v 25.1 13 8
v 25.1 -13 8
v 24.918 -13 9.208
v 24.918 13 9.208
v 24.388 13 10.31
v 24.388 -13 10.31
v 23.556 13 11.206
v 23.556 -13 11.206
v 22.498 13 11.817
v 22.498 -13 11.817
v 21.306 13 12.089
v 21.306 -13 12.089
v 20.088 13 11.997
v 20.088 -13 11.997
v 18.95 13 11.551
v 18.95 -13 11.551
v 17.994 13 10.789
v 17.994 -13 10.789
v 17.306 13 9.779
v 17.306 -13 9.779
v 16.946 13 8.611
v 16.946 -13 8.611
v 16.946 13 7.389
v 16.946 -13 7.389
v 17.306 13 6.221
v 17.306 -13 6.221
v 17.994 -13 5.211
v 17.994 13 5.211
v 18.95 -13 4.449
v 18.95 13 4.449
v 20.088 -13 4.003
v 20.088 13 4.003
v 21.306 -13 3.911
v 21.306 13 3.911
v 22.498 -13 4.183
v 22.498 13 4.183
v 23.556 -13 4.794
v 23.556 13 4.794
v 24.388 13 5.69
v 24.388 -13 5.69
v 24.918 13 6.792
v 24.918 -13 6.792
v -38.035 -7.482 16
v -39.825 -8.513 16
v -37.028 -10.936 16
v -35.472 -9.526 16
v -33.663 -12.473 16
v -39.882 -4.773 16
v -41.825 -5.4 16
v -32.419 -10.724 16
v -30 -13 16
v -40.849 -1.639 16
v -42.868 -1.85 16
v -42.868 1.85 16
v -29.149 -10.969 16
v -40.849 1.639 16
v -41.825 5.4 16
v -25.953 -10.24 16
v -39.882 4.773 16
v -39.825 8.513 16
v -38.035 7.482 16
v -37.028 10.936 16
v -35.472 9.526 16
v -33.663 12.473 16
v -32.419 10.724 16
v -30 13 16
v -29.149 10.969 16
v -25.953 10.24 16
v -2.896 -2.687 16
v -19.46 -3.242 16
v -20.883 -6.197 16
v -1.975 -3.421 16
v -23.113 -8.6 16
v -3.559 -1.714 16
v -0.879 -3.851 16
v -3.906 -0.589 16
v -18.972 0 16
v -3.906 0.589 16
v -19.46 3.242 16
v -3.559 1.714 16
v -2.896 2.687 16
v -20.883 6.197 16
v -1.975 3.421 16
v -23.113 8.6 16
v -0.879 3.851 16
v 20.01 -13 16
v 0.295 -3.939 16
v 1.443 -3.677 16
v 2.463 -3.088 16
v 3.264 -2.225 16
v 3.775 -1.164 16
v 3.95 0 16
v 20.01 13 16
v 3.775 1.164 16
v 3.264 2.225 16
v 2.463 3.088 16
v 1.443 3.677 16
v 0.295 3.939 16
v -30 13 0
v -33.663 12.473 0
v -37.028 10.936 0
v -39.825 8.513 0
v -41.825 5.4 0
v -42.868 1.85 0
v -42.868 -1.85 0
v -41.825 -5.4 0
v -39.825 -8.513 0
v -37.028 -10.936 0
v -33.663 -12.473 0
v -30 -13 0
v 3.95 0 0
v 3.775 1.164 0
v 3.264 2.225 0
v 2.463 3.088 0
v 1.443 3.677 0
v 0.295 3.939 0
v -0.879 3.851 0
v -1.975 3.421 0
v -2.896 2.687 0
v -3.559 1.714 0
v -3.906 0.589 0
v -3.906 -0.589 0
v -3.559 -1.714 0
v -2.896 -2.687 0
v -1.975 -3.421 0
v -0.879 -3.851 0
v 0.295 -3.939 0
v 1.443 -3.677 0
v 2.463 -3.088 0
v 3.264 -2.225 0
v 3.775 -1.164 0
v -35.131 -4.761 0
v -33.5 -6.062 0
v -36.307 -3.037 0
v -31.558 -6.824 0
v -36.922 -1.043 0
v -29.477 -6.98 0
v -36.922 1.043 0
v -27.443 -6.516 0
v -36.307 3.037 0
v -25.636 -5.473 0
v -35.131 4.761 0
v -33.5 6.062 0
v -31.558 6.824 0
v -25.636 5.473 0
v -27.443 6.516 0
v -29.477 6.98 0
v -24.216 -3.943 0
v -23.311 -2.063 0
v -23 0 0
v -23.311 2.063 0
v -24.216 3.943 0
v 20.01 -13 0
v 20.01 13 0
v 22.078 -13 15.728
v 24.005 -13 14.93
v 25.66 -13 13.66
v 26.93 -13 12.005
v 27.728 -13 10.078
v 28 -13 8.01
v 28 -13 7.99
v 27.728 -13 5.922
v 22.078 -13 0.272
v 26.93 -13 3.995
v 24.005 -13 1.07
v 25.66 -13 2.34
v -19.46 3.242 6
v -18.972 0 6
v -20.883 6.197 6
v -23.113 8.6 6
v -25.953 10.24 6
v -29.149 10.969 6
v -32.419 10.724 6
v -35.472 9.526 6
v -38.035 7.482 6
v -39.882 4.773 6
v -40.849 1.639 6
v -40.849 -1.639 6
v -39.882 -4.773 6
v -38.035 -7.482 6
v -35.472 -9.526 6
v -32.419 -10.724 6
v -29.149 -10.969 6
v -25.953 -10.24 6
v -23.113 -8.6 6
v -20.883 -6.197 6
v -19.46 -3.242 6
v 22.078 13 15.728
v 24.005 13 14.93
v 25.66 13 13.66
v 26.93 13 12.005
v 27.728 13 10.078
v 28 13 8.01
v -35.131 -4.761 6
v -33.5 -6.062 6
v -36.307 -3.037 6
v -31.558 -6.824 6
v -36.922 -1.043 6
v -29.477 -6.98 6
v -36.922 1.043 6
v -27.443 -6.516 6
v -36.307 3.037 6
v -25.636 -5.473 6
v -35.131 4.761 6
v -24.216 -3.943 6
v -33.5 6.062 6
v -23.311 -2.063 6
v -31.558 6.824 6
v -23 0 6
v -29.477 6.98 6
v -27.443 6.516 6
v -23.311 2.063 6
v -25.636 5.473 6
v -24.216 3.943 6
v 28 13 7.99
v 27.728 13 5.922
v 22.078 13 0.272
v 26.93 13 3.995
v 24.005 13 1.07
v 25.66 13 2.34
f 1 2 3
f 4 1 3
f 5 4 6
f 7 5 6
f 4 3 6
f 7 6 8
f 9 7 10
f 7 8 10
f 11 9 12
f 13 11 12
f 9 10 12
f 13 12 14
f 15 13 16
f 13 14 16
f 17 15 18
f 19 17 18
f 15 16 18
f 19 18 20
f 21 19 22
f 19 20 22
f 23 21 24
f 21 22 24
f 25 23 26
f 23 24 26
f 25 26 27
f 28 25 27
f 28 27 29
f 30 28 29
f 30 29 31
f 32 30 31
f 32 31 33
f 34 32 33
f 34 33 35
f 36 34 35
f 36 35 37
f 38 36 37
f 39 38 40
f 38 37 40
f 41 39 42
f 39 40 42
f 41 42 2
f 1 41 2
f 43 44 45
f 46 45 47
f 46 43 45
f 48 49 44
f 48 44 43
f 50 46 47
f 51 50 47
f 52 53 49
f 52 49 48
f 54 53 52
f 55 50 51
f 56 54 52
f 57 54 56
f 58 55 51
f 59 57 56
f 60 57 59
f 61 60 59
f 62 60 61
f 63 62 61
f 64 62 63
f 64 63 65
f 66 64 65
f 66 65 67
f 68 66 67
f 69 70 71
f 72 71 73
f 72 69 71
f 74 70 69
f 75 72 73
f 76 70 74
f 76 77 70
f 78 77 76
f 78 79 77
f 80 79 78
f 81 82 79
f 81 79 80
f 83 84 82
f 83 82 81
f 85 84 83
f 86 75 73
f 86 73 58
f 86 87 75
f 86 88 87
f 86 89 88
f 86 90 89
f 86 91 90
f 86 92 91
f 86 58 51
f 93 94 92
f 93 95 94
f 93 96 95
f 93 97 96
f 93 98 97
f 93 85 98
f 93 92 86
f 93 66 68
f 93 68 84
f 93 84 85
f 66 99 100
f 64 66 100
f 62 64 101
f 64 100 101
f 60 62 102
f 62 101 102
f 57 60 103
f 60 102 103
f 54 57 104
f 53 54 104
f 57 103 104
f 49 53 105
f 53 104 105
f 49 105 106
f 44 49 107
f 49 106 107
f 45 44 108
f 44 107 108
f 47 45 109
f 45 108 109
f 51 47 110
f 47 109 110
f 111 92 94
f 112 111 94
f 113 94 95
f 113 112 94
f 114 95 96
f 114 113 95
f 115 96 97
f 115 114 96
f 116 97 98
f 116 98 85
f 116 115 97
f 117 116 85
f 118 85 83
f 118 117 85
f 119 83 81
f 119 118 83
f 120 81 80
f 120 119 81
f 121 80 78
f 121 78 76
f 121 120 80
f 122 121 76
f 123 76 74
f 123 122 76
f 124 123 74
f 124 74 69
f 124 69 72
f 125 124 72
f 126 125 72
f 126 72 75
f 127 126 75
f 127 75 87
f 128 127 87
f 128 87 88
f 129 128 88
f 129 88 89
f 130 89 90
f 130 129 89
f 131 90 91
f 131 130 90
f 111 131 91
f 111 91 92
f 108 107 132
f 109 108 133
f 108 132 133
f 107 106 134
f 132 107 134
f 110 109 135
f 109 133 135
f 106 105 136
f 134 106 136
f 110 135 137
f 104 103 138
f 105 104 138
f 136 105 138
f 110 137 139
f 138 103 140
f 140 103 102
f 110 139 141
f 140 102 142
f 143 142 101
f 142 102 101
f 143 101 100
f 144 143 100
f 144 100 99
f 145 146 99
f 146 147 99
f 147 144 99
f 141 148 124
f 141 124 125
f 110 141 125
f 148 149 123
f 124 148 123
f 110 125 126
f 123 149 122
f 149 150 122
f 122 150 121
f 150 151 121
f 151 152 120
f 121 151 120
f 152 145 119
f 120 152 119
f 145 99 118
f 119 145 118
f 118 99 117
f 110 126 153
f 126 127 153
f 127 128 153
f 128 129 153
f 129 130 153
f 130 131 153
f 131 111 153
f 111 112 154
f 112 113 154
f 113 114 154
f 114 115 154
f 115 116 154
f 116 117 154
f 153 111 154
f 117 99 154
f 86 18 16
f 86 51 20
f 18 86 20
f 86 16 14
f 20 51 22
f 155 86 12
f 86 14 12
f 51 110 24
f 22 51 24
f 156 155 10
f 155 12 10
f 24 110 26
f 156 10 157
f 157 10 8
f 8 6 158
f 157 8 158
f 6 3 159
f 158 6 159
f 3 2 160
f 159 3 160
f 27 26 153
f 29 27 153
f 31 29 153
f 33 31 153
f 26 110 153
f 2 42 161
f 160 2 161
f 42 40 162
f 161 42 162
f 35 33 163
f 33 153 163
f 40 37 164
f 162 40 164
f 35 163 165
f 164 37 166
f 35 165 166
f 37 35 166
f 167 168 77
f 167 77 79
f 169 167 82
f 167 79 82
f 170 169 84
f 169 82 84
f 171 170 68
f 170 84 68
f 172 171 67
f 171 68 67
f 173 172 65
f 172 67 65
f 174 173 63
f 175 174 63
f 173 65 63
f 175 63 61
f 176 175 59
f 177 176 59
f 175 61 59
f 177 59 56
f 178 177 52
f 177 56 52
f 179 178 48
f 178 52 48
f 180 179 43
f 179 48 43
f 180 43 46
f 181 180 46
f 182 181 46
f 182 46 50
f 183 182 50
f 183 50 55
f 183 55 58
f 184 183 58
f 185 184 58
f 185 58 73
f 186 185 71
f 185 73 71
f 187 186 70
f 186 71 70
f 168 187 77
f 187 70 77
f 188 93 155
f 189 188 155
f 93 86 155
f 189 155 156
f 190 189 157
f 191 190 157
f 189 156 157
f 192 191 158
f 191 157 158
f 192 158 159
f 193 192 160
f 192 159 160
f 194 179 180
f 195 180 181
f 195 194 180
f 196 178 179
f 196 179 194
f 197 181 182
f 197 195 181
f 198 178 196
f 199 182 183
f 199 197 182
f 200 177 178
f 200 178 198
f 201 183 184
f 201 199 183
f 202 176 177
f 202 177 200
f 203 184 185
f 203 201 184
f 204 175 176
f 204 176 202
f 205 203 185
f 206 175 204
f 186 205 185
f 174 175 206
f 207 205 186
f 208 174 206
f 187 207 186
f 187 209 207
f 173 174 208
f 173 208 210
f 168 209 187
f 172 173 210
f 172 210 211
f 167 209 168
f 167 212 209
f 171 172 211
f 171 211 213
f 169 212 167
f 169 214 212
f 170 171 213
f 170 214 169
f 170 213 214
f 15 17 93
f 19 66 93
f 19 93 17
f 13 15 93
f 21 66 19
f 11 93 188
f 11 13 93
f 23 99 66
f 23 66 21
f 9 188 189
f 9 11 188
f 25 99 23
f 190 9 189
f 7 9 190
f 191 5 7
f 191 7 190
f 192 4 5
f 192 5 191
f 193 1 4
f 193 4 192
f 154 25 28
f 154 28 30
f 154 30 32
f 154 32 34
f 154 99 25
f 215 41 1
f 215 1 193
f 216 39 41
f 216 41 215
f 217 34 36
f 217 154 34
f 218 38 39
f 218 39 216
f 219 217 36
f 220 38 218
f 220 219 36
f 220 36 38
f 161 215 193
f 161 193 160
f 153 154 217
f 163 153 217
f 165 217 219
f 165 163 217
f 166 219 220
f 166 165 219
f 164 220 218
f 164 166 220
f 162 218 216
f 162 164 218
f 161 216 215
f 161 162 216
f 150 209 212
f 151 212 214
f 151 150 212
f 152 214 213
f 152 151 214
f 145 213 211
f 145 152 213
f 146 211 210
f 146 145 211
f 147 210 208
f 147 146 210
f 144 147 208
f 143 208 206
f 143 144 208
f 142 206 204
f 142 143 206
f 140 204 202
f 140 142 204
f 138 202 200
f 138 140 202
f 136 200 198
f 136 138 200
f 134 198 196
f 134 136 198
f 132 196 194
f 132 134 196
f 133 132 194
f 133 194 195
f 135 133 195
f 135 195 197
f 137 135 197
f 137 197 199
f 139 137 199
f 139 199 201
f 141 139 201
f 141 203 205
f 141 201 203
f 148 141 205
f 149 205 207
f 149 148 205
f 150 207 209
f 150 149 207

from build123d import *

# Parameters (mm, degrees)
SKETCH002_R  = 11
PAD002_DEPTH = 10
SKETCH001_R  = 4.1
PAD001_DEPTH = 26
SKETCH_R     = 7
SKETCH_R_2   = 3.95
PAD_DEPTH    = 16
FILLET_R     = 7.99


with BuildPart() as pad002:
    # Sketch002 → Pad002 (new body)
    with BuildSketch(Plane.XY.offset(16)):
        with Locations((-29.971518, 0)):
            Circle(SKETCH002_R)
    extrude(amount=-PAD002_DEPTH)


with BuildPart() as cutblock:
    # Sketch001 → Pad001 (new body)
    with BuildSketch(Plane.XZ.offset(13)):
        with Locations((21, 8)):
            Circle(SKETCH001_R)
    extrude(amount=-PAD001_DEPTH)

    # Fusion: union Pad002
    add(pad002.part)


with BuildPart() as fillet_body:
    # Sketch → Pad (new body)
    with BuildSketch(Plane.XY):
        with BuildLine():
            ThreePointArc((-30, 13), (-43, 0), (-30, -13))
            Line((-30, -13), (28, -13))
            Line((28, 13), (28, -13))
            Line((-30, 13), (28, 13))
        make_face()
        with Locations((-30, 0)):
            Circle(SKETCH_R, mode=Mode.SUBTRACT)
        Circle(SKETCH_R_2, mode=Mode.SUBTRACT)
    extrude(amount=PAD_DEPTH)

    # Cut: cut CutBlock
    add(cutblock.part, mode=Mode.SUBTRACT)

    # Fillet
    fillet_edges = [fillet_body.edges().sort_by_distance(p)[0] for p in [
        (28, 0, 16),
        (28, 0, 0),
    ]]
    fillet(fillet_edges, radius=FILLET_R)


solid = fillet_body.part
